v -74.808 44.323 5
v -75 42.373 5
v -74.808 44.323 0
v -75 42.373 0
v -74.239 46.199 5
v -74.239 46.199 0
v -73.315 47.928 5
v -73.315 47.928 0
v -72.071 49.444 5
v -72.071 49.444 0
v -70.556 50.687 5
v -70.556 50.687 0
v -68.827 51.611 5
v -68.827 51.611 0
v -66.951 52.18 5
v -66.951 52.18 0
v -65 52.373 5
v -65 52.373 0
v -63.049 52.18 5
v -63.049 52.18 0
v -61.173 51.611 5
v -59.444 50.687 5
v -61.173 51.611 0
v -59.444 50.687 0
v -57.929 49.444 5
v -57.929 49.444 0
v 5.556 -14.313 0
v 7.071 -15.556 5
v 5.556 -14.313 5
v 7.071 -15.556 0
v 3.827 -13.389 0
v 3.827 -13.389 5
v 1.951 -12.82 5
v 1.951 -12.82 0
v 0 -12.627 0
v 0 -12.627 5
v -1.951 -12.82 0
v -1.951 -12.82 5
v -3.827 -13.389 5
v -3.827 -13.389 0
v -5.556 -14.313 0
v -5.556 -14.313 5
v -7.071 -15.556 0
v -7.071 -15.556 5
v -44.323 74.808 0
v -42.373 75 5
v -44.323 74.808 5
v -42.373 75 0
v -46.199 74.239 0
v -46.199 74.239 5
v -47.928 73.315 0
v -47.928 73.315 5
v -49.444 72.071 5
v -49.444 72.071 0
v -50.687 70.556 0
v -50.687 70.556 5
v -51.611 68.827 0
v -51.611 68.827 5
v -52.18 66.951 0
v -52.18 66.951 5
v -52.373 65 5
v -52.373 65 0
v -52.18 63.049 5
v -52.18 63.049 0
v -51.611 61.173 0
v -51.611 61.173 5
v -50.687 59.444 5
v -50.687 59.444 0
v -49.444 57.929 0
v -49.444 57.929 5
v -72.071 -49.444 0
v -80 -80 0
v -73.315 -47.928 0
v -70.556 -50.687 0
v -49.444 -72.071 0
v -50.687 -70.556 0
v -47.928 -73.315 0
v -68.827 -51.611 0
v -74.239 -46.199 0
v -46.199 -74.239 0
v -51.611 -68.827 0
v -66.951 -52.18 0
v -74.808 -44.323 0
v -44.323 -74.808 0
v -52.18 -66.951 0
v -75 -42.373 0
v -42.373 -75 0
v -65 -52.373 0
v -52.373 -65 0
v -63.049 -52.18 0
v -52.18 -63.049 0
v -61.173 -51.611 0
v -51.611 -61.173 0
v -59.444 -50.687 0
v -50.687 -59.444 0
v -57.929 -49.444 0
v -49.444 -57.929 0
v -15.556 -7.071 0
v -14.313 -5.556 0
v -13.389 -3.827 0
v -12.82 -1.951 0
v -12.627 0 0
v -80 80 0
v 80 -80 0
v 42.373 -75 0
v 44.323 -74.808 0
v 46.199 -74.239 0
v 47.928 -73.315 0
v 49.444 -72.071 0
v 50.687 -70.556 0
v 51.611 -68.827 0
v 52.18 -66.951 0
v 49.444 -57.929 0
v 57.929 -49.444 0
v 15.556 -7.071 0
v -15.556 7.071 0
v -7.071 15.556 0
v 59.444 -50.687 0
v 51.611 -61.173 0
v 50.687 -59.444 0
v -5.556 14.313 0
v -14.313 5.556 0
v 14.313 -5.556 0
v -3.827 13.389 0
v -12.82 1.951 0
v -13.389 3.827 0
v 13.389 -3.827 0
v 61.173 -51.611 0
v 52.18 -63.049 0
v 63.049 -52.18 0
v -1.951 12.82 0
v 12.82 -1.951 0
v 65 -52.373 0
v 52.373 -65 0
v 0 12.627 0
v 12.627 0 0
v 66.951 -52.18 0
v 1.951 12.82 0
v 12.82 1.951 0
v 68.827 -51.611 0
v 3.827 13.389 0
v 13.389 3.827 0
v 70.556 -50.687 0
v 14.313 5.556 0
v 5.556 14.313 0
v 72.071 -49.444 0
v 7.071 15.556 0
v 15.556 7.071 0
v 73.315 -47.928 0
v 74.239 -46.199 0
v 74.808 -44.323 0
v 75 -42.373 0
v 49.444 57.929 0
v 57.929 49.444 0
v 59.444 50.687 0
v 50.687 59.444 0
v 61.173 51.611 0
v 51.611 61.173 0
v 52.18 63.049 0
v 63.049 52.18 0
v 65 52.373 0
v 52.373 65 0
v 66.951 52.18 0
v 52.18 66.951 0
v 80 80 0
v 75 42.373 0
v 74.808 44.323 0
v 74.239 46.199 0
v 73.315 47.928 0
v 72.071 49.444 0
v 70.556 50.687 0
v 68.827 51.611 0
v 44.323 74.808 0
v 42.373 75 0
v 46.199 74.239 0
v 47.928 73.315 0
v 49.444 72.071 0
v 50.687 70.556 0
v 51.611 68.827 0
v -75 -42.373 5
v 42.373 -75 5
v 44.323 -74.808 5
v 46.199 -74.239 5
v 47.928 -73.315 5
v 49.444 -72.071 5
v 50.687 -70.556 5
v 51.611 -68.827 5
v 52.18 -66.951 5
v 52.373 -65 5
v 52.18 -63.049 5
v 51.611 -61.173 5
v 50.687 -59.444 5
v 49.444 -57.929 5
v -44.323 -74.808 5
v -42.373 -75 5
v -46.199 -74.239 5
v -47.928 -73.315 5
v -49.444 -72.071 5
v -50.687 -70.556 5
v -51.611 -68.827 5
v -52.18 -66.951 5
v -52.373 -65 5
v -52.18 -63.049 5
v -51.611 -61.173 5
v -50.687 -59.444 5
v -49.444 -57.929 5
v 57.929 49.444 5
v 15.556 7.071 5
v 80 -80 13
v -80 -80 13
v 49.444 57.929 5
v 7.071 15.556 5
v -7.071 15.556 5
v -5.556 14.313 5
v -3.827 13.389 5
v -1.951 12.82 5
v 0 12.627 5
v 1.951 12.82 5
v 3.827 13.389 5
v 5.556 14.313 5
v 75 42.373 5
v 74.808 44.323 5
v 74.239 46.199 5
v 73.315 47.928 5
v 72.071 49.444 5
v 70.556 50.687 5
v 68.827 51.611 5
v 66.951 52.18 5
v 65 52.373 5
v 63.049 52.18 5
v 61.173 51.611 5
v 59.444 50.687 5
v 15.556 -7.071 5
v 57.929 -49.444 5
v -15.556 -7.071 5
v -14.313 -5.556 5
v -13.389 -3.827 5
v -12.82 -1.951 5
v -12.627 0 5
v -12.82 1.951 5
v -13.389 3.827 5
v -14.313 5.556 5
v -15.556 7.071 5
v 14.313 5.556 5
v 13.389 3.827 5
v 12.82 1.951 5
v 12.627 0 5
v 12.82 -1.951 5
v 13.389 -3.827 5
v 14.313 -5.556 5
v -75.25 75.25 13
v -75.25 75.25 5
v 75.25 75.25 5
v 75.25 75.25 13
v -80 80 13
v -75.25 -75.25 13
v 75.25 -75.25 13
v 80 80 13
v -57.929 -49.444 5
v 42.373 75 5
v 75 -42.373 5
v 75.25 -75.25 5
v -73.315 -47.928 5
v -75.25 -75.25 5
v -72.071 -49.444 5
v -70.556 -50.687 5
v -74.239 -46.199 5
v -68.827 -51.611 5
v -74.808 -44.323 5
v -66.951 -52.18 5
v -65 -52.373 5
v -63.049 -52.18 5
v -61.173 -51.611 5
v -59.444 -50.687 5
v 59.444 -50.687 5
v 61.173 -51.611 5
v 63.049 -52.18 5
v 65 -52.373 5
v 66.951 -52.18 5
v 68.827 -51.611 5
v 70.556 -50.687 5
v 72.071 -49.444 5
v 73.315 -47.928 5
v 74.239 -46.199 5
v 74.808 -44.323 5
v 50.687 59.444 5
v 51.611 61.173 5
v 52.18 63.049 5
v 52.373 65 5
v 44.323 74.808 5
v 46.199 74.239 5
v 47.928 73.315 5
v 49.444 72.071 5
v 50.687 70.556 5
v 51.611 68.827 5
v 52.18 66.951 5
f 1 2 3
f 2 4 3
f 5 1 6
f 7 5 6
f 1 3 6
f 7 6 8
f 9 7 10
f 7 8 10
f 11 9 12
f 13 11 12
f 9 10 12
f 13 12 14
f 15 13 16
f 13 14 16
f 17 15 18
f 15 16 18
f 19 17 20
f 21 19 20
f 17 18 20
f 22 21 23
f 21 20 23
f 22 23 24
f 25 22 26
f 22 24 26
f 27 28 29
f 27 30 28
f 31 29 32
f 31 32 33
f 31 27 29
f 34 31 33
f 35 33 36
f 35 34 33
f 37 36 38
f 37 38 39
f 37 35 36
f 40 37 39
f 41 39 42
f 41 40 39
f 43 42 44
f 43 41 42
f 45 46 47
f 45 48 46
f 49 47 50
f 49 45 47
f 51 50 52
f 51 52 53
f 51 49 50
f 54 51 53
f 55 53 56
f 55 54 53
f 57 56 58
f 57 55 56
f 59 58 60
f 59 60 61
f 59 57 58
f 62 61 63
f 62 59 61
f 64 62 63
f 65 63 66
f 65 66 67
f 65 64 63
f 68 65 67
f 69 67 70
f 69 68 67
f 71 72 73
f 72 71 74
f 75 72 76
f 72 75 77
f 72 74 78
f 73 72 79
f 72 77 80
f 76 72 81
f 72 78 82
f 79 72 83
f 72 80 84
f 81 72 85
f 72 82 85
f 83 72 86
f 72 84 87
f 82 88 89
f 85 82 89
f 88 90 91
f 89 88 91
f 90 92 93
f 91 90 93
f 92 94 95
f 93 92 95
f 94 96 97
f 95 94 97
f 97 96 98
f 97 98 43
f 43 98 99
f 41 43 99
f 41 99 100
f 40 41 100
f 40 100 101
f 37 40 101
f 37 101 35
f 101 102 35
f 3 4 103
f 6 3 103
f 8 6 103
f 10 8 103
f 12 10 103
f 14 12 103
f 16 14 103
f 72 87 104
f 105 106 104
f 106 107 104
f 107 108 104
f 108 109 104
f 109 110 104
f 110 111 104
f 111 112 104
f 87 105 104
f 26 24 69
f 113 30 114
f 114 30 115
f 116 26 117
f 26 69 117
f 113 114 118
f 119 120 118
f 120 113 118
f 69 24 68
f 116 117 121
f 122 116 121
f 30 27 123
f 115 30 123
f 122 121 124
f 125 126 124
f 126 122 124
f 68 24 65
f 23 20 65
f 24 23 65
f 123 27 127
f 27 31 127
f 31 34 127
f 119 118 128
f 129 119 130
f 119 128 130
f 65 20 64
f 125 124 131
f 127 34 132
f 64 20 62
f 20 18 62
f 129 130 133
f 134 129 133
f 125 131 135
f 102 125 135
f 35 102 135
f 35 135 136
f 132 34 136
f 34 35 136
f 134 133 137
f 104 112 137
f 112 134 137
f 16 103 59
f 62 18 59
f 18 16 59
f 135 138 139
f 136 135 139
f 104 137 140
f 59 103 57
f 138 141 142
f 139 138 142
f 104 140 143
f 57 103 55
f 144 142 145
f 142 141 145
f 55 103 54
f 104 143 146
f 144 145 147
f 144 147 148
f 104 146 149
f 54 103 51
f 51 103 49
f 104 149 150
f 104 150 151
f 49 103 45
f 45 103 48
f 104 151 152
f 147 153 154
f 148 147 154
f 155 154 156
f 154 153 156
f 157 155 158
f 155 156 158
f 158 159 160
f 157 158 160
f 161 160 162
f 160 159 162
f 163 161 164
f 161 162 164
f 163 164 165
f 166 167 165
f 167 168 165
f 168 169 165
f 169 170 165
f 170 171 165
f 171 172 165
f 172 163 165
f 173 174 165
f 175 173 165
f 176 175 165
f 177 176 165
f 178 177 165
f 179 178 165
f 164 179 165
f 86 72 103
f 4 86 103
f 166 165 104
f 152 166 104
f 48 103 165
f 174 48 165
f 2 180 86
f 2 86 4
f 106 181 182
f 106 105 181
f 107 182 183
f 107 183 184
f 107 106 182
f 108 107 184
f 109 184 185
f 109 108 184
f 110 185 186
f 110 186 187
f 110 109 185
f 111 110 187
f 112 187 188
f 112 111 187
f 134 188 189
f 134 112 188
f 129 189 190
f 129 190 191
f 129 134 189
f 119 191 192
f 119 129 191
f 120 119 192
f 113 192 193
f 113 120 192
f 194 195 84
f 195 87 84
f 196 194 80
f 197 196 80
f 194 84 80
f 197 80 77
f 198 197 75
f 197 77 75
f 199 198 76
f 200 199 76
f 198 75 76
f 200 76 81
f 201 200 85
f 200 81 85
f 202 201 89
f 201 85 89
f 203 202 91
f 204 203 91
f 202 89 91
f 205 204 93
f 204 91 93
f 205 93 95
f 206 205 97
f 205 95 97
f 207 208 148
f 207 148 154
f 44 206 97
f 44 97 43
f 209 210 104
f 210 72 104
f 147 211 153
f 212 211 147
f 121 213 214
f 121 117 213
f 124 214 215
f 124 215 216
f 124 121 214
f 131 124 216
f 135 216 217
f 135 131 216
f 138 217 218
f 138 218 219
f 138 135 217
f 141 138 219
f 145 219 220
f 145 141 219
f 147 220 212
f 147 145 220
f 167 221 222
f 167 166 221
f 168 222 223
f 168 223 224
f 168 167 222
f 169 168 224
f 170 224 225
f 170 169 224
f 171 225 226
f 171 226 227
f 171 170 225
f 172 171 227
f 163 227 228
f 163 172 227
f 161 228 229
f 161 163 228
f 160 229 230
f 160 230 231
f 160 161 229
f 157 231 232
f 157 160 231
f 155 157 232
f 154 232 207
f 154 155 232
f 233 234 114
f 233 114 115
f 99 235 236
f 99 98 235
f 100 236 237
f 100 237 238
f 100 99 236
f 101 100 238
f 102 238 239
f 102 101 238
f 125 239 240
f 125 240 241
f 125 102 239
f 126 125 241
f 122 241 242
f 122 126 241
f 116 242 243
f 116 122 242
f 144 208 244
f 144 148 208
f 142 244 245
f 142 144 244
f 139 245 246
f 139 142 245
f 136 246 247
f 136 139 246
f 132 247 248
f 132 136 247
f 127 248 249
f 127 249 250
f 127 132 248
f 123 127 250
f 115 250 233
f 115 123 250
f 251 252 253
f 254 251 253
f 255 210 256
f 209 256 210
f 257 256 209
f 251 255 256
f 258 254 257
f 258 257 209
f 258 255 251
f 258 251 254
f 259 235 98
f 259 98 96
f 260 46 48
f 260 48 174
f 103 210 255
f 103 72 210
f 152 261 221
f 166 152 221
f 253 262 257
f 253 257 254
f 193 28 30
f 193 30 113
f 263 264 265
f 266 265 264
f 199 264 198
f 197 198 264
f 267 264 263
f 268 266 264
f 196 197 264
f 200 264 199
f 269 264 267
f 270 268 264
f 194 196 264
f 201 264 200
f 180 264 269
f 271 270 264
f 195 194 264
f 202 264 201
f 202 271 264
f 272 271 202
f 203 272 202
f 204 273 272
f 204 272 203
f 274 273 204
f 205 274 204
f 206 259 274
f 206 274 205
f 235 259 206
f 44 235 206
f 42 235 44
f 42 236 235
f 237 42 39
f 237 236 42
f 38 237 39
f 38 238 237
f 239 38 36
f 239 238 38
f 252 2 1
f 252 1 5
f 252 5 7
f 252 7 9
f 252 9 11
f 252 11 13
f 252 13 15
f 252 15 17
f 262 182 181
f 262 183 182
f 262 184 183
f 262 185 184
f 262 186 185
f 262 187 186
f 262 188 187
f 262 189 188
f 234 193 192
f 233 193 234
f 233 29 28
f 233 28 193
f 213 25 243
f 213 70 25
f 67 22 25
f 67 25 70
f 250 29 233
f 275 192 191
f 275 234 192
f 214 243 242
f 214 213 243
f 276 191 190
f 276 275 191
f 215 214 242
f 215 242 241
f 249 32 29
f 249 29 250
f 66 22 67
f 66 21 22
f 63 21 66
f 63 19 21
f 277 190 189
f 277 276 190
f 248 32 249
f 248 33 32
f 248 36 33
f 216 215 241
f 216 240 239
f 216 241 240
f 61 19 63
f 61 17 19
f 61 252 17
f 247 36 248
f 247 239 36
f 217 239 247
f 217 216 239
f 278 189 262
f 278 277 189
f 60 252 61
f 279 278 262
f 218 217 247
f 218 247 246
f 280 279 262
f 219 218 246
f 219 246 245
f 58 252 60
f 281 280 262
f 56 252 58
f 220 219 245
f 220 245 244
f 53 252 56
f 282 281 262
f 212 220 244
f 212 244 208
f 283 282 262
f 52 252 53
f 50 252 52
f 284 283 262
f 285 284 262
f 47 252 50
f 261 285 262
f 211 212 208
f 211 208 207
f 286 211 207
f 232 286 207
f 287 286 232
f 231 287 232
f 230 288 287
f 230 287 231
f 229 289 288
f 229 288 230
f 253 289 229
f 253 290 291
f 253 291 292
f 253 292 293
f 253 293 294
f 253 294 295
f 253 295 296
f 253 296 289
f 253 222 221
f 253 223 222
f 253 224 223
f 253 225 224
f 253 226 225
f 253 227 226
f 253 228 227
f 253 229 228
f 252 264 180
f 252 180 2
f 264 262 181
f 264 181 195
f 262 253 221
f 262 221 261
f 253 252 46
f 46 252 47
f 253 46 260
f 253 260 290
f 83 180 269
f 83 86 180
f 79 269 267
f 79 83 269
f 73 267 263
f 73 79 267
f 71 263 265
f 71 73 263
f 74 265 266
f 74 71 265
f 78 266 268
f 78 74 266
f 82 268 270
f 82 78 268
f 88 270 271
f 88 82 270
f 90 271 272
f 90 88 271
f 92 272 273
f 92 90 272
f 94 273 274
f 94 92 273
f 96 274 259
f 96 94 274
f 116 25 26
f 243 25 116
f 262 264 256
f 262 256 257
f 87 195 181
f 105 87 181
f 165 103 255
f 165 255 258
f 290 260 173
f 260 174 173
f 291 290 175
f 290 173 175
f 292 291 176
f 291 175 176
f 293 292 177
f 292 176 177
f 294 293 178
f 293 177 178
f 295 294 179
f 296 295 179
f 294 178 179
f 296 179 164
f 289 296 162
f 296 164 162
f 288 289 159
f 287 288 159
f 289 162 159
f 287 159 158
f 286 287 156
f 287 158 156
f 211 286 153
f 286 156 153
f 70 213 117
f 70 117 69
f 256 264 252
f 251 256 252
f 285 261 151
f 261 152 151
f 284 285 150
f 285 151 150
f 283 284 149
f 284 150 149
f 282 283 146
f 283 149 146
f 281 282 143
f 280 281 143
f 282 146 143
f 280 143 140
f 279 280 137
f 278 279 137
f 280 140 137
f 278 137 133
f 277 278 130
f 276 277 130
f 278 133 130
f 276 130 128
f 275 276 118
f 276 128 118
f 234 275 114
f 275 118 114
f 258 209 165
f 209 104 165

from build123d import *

# Parameters (mm, degrees)
SKETCH2_W           = 160
SKETCH2_H           = 160
BOSS_EXTRUDE1_DEPTH = 5
CUT_EXTRUDE1_REACH  = 115.248
SKETCH3_W           = 150
SKETCH3_H           = 150
BOSS_EXTRUDE2_DEPTH = 5
SKETCH5_W           = 160
SKETCH5_H           = 160
SKETCH5_W_2         = 150.5
SKETCH5_H_2         = 150.5
BOSS_EXTRUDE3_DEPTH = 8
FILLET1_R           = 10


with BuildPart() as part:
    # Sketch2 → Boss-Extrude1 (new body)
    with BuildSketch(Plane.XY):
        Rectangle(SKETCH2_W, SKETCH2_H)
    extrude(amount=BOSS_EXTRUDE1_DEPTH)

    # Sketch3 → Cut-Extrude1 (cut, up to next)
    with BuildSketch(Plane.XY.offset(5), mode=Mode.PRIVATE) as cut_extrude1_sk1:
        Rectangle(SKETCH3_W, SKETCH3_H)
    cut_extrude1_tool1 = extrude(cut_extrude1_sk1.sketch, amount=-CUT_EXTRUDE1_REACH, mode=Mode.PRIVATE) & part.part
    add(cut_extrude1_tool1.solids().sort_by_distance((0, 0, 5))[0], mode=Mode.SUBTRACT)

    # Sketch4 → Boss-Extrude2 (add)
    with BuildSketch(Plane.XY.offset(5)):
        Polygon((66.514718626, 75), (0, 8.485281374), (-66.514718626, 75), (-75, 75), (-75, 66.514718626), (-8.485281374, 0), (-75, -66.514718626), (-75, -75), (-66.514718626, -75), (0, -8.485281374), (66.514718626, -75), (75, -75), (75, -66.514718626), (8.485281374, 0), (75, 66.514718626), (75, 75), align=None)
    extrude(amount=-BOSS_EXTRUDE2_DEPTH)

    # Sketch5 → Boss-Extrude3 (add)
    with BuildSketch(Plane.XY.offset(5)):
        Rectangle(SKETCH5_W, SKETCH5_H)
        Rectangle(SKETCH5_W_2, SKETCH5_H_2, mode=Mode.SUBTRACT)
    extrude(amount=BOSS_EXTRUDE3_DEPTH)

    # Fillet1
    fillet1_edges = [part.edges().sort_by_distance(p)[0] for p in [
        (-66.514718626, 75, 2.5),
        (0, 8.485281374, 2.5),
        (66.514718626, 75, 2.5),
        (75, 66.514718626, 2.5),
        (8.485281374, 0, 2.5),
        (75, -66.514718626, 2.5),
        (66.514718626, -75, 2.5),
        (0, -8.485281374, 2.5),
        (-66.514718626, -75, 2.5),
        (-75, -66.514718626, 2.5),
        (-8.485281374, 0, 2.5),
        (-75, 66.514718626, 2.5),
    ]]
    fillet(fillet1_edges, radius=FILLET1_R)


solid = part.part
